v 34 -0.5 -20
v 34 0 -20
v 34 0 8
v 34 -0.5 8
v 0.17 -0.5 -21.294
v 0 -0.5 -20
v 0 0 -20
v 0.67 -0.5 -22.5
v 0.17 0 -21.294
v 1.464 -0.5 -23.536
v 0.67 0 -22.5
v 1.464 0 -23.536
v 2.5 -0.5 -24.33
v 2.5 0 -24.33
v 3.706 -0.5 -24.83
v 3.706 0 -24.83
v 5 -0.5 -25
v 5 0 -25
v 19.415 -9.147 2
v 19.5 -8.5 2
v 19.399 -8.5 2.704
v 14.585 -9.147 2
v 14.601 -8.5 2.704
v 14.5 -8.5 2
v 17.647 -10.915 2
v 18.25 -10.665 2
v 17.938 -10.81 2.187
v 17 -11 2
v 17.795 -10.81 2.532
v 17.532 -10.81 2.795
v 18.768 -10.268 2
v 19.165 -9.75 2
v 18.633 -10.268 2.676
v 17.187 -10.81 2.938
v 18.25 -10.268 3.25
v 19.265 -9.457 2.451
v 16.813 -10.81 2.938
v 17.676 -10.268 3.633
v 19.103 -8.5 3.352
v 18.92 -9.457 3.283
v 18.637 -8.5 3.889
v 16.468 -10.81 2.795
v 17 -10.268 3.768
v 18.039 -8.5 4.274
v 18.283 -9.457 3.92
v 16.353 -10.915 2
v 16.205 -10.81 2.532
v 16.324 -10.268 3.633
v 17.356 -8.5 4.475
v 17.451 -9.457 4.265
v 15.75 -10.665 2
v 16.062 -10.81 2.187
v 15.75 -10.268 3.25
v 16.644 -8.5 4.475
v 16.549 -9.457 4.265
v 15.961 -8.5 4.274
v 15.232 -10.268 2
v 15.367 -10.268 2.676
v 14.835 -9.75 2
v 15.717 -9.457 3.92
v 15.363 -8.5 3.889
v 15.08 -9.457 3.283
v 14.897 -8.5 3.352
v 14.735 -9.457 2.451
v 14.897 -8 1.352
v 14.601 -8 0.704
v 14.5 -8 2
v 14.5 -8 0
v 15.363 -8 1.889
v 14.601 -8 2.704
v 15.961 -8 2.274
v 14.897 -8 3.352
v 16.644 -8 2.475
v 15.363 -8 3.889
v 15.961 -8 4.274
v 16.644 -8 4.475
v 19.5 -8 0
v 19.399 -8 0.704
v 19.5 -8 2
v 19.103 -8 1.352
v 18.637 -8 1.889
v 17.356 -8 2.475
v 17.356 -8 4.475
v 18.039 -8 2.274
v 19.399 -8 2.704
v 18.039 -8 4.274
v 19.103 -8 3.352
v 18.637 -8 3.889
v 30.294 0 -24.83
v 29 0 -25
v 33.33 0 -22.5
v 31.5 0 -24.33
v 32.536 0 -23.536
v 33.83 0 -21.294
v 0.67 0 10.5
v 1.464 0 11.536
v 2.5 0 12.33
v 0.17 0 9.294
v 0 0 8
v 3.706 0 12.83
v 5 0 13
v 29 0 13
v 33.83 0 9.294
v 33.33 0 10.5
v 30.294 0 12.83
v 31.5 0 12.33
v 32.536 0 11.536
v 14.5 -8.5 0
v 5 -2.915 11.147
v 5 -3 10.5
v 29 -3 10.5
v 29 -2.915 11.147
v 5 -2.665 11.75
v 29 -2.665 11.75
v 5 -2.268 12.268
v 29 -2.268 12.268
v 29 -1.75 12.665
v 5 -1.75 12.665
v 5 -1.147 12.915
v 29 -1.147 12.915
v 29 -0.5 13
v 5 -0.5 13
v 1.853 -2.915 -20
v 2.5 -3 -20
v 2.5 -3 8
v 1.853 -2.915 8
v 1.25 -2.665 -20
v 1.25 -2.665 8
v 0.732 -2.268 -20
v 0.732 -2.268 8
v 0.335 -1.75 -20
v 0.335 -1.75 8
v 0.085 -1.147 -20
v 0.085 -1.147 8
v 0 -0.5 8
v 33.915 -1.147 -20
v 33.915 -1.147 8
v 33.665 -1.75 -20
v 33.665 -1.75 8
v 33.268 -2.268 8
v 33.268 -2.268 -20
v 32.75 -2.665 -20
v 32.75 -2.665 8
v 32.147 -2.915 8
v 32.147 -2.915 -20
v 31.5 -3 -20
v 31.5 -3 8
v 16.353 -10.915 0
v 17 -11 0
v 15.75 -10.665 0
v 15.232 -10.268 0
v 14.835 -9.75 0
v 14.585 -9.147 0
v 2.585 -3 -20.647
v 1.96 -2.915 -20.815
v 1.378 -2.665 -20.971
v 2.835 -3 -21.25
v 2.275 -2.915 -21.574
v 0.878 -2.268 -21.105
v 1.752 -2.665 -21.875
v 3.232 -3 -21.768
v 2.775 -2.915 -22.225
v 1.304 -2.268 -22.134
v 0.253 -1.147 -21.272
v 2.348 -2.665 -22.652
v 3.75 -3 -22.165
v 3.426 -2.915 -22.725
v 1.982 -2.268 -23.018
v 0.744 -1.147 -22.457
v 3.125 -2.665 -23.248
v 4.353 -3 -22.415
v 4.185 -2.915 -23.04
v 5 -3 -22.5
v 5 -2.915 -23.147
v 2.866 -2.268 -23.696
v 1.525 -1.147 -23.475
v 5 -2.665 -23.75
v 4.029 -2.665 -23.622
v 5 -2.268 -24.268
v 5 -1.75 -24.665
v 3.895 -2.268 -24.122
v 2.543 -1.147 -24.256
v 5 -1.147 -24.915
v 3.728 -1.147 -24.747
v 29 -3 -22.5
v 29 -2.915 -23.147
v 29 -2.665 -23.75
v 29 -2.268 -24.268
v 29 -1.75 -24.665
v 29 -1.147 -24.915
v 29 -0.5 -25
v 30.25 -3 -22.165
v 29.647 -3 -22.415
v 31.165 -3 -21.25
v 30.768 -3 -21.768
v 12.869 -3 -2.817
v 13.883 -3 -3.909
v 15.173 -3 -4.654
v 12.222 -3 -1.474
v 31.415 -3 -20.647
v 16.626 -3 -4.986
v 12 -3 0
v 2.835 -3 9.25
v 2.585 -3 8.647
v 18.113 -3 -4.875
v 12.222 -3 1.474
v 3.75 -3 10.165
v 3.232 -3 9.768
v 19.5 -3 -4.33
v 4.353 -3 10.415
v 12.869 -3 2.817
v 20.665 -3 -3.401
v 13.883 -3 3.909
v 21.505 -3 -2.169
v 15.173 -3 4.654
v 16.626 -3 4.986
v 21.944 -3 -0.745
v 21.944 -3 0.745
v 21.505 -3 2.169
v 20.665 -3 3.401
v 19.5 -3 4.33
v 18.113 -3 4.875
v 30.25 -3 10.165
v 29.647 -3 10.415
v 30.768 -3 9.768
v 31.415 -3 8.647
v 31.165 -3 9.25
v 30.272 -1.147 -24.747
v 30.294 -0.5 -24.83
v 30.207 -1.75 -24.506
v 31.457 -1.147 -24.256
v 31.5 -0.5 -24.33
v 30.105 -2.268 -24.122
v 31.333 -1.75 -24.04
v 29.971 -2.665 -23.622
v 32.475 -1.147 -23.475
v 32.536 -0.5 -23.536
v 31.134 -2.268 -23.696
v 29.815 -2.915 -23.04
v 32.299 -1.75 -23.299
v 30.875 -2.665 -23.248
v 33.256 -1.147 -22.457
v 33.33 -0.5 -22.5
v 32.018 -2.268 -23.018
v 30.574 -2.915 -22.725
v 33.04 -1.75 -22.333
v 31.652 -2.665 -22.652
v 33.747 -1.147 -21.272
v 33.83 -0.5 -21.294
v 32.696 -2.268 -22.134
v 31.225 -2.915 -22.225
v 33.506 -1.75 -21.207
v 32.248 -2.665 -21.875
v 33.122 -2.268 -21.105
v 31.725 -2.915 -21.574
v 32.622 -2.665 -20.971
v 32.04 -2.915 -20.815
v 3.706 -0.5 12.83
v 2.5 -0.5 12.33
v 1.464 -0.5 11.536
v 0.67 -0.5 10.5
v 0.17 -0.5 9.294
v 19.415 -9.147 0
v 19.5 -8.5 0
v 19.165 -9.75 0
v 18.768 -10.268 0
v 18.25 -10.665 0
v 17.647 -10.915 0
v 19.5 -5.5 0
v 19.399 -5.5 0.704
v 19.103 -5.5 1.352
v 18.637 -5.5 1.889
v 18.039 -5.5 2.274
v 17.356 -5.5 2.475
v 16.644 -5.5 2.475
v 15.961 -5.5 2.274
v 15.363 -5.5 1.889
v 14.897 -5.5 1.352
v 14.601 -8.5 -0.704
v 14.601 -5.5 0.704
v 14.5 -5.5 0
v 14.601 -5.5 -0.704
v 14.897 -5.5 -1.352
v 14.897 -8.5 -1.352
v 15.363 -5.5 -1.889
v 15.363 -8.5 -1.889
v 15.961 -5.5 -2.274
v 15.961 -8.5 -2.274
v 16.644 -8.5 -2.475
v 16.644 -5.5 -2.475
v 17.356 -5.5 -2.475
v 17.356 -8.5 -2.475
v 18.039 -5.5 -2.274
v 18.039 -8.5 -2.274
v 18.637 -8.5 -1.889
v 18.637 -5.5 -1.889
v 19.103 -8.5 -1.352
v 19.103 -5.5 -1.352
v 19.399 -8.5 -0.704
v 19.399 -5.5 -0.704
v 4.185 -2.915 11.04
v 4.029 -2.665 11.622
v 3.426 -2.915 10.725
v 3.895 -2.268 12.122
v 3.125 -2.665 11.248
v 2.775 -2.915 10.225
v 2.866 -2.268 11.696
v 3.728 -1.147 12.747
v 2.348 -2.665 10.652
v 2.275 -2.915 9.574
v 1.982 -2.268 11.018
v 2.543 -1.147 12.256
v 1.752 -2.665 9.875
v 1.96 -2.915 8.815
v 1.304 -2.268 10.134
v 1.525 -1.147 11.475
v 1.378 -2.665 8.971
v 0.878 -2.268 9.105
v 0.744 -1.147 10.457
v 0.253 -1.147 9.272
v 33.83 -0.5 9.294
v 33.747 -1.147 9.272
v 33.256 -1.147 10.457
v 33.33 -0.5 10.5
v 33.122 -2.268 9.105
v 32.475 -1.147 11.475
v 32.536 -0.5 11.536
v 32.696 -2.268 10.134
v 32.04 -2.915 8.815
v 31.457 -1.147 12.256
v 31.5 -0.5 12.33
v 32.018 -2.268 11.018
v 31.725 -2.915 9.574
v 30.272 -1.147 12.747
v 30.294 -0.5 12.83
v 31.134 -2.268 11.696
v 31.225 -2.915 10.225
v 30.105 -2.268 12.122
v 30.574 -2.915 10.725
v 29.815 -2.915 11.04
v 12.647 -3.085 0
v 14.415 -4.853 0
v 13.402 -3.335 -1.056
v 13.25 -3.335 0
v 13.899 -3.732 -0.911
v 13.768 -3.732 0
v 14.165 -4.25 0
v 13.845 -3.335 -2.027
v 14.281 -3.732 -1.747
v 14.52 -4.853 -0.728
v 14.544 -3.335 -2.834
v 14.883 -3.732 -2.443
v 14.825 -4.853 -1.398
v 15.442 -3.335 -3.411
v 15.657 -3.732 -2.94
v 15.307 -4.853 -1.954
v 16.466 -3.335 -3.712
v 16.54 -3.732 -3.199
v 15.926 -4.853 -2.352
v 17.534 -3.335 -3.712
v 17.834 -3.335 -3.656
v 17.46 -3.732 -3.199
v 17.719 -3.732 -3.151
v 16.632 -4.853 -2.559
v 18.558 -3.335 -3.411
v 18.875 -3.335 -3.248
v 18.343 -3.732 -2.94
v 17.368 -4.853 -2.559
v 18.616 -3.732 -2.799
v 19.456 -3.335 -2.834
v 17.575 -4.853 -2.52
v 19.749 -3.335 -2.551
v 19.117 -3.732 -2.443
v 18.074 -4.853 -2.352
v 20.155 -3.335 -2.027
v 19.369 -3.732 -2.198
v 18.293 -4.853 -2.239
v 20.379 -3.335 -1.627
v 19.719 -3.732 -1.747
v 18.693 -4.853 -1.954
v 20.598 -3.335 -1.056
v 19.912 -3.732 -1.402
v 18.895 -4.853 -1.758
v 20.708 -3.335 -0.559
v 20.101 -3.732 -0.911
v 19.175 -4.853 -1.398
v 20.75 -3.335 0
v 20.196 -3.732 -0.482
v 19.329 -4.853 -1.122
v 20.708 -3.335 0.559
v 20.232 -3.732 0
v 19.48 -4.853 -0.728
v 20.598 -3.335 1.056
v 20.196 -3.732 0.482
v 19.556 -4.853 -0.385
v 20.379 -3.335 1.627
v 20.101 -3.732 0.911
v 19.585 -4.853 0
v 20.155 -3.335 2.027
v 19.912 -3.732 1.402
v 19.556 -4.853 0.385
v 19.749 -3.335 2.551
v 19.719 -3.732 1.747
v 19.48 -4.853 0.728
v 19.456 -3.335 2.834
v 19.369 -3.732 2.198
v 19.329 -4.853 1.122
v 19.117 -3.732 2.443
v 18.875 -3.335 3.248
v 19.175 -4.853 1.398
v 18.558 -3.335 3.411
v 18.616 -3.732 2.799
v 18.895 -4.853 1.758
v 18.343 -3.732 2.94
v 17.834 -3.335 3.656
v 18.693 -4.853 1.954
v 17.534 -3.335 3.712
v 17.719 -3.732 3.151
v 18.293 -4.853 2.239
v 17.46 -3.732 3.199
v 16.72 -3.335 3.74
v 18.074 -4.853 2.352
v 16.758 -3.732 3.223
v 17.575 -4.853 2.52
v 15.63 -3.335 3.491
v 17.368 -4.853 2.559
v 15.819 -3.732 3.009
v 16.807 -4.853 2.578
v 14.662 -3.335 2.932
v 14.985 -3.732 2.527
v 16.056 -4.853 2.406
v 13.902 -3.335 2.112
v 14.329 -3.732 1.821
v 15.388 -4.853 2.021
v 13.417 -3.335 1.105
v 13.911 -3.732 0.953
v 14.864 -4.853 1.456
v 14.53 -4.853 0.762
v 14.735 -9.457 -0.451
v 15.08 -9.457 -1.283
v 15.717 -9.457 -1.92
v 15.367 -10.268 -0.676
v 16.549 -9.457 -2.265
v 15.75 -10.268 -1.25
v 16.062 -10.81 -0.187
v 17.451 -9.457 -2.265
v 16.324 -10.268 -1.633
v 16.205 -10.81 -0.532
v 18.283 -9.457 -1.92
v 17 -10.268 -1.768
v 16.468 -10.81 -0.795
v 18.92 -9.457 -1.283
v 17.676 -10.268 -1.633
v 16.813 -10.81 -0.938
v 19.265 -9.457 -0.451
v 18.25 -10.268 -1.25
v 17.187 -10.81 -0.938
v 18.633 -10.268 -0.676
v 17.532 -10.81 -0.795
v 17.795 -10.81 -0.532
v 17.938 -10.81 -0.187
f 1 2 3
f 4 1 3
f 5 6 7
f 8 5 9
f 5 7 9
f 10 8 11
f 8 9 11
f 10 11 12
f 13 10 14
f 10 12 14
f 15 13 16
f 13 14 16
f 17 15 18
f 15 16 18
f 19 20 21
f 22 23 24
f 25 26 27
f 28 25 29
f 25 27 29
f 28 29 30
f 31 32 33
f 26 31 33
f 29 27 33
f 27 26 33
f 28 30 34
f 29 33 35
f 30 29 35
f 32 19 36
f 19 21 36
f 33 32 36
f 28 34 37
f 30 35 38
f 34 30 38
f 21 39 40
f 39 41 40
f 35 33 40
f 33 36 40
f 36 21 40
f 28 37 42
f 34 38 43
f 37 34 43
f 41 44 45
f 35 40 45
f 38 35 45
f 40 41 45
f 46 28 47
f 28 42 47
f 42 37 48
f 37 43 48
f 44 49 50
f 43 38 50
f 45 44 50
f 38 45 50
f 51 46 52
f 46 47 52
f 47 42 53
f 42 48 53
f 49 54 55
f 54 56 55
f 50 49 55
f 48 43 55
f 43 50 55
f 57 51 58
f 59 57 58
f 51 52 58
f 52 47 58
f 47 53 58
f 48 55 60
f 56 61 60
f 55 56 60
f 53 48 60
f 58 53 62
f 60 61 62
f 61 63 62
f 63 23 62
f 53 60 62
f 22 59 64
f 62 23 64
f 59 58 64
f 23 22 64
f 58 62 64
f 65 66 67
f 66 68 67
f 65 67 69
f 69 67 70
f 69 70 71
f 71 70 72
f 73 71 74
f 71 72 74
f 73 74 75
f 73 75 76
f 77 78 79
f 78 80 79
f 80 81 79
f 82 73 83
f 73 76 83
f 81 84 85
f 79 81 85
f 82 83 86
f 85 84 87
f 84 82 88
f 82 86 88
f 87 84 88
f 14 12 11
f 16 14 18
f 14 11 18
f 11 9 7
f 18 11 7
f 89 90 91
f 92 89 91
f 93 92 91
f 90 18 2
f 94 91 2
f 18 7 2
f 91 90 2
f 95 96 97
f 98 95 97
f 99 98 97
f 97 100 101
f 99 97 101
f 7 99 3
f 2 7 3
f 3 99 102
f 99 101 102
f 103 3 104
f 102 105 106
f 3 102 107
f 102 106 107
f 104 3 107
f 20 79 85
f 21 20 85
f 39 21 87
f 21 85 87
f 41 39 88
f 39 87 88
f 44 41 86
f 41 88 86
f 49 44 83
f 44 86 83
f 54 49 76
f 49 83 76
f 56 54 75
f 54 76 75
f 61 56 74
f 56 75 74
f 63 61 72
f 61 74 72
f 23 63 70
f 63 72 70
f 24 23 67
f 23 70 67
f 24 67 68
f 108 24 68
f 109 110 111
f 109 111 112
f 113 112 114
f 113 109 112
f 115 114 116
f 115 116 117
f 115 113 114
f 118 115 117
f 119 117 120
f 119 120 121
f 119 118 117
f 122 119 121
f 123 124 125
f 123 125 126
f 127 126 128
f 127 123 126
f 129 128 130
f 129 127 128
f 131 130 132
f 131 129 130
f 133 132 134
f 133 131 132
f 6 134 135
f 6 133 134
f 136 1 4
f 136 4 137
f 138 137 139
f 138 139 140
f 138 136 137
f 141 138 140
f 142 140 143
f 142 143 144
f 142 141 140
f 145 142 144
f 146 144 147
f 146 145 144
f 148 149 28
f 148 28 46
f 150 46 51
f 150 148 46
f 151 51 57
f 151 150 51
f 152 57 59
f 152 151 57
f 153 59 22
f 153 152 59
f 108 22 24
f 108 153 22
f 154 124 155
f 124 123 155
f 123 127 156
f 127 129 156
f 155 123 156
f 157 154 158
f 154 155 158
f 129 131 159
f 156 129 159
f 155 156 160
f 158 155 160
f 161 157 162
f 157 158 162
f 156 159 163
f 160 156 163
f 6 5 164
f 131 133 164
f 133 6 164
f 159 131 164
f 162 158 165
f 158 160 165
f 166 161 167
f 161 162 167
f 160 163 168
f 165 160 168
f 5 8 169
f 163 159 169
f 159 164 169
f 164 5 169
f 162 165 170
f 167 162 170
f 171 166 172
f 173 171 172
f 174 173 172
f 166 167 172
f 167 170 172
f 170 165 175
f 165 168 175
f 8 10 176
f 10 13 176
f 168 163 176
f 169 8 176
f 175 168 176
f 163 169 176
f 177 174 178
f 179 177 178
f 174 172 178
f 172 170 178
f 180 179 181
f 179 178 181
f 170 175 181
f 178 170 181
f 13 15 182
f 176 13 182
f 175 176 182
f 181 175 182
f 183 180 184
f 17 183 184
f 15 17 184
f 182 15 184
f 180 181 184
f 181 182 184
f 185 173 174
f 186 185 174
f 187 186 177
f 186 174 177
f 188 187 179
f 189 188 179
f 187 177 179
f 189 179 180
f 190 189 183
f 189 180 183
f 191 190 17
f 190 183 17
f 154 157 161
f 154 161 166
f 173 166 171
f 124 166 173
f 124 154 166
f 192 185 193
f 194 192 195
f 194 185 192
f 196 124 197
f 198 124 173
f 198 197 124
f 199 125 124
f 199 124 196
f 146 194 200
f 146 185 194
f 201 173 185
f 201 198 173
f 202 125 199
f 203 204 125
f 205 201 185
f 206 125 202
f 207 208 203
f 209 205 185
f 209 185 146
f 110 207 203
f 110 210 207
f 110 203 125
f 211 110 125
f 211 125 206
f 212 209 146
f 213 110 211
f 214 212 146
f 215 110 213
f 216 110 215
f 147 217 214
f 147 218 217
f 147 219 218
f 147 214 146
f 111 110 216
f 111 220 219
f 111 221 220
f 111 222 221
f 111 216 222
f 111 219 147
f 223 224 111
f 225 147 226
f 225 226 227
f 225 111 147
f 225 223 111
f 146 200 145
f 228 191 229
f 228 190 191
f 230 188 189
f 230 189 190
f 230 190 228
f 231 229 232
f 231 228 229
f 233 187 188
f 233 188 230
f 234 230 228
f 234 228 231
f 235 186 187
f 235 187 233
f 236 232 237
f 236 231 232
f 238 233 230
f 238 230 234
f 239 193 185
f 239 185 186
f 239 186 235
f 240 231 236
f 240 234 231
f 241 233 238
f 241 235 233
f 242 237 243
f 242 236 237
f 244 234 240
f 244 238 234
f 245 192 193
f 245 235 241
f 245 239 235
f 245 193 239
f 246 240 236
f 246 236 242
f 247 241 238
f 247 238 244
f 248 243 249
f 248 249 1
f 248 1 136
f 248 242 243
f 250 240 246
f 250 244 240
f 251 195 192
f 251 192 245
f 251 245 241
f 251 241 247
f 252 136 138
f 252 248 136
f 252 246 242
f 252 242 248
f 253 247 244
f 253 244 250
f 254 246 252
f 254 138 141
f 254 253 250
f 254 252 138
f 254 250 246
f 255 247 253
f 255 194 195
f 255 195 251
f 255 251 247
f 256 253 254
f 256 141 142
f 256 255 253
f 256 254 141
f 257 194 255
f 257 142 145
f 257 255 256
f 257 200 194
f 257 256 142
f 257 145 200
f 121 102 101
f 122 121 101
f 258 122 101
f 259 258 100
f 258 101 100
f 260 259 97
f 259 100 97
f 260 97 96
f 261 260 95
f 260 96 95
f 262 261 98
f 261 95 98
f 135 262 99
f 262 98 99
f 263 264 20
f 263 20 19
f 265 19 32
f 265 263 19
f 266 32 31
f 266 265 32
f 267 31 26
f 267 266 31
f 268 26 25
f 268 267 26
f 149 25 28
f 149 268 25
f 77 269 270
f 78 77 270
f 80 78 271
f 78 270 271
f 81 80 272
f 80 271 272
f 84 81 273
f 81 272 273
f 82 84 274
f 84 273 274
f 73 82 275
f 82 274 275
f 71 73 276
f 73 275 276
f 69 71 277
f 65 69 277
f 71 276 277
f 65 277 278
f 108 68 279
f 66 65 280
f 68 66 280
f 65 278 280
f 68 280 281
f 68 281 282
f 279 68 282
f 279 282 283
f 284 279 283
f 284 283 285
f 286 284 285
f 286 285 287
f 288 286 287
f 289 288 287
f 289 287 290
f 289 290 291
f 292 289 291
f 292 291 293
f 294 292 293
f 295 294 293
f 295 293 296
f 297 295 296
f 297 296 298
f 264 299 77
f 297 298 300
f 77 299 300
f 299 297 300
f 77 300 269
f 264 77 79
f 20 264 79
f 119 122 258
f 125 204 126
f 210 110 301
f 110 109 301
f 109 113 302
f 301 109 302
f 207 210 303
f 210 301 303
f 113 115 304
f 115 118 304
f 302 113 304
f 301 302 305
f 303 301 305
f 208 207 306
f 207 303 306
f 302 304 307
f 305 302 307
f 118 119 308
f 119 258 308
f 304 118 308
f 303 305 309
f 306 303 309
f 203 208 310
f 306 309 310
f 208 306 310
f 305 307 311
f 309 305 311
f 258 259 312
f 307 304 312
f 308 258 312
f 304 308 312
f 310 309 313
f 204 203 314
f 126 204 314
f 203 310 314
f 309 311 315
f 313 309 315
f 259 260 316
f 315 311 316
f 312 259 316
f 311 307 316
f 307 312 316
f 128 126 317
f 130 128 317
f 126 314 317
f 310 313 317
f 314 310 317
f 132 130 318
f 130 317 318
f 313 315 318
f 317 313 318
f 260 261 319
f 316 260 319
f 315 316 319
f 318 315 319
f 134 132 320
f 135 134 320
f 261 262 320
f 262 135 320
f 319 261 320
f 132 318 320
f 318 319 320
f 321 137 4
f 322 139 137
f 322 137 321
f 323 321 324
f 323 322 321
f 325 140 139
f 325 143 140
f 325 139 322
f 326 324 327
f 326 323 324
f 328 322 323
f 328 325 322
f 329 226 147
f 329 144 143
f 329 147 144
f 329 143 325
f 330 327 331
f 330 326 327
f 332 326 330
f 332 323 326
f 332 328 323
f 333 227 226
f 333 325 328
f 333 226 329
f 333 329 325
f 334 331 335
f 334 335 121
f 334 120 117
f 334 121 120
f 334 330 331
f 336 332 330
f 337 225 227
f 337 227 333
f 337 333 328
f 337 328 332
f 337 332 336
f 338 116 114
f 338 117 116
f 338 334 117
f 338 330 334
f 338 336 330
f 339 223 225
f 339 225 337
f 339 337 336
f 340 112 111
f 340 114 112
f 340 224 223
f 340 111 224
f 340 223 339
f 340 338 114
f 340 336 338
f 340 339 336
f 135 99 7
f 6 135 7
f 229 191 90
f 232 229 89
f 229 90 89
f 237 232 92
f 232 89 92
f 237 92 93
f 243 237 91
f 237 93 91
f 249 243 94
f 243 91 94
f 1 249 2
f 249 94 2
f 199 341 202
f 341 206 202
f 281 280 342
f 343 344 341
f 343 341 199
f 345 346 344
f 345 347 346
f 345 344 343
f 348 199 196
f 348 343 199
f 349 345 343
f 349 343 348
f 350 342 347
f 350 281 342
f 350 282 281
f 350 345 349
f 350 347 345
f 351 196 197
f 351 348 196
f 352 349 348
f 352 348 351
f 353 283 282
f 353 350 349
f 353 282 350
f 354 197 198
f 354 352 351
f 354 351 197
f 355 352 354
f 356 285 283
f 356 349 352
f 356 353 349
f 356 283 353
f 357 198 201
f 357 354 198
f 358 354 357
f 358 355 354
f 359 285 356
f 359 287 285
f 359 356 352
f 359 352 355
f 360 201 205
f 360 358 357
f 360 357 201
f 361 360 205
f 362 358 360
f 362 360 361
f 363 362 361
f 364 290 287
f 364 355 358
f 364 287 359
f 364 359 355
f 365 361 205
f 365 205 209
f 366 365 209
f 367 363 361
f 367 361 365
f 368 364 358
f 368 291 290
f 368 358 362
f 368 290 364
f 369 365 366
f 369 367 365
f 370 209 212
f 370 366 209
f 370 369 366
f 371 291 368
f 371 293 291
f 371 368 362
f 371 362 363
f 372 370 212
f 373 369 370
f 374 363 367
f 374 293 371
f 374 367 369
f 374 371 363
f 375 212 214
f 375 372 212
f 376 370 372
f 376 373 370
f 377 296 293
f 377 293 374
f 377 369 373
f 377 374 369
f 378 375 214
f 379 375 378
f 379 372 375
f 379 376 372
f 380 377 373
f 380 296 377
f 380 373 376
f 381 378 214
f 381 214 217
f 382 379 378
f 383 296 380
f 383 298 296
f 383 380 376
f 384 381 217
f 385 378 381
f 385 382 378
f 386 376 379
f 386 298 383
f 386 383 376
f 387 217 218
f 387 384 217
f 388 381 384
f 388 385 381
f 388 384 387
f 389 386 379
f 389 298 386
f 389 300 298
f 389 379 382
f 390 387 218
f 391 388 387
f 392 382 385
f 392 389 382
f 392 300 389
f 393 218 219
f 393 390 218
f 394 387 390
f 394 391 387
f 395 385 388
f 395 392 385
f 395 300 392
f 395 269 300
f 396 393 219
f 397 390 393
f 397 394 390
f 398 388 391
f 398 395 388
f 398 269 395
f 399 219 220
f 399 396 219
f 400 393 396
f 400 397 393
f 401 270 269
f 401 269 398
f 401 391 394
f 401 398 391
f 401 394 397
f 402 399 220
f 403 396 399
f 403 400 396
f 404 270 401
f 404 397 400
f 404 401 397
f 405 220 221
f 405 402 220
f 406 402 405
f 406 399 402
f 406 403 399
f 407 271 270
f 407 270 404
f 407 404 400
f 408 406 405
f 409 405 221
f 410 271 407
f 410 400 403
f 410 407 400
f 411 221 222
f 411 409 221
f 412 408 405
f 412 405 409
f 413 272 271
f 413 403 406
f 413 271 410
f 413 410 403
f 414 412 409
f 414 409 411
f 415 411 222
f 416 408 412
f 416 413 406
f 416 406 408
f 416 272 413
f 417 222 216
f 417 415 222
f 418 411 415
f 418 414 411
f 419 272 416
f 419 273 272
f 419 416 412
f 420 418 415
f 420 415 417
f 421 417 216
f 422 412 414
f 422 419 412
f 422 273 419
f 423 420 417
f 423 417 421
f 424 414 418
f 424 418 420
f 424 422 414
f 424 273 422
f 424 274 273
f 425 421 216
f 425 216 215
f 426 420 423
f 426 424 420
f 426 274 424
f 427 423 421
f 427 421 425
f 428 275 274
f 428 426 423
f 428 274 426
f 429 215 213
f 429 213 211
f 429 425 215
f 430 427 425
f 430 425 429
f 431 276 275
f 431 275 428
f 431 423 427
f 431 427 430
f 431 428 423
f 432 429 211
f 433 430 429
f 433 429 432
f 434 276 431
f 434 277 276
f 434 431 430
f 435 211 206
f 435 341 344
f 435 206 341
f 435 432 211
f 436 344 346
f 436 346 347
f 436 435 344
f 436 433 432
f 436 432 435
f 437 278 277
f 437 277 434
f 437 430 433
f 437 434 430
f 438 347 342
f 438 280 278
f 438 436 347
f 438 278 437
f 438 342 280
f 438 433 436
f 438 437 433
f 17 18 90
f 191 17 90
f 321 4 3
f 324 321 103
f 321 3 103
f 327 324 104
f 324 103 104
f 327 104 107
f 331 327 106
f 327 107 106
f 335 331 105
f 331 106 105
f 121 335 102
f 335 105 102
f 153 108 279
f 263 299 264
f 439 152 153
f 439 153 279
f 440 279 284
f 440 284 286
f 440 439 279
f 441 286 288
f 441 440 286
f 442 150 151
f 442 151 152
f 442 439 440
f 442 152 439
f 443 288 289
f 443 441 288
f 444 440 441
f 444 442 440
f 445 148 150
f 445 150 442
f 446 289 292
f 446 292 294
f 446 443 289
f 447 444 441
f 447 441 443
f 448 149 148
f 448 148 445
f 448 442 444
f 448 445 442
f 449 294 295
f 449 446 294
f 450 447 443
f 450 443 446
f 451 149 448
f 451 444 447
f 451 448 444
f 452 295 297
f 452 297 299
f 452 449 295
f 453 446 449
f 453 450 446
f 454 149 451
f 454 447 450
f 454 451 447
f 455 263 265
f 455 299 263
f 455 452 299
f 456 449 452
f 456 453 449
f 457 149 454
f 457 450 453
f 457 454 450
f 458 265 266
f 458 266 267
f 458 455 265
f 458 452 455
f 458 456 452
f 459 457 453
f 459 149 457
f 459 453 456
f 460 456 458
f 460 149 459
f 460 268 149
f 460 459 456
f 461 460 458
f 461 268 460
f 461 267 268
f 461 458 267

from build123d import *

# Parameters (mm, degrees)
F1_DEPTH     = 3
F3_DEPTH     = 5
F5_DEPTH     = 3
F6_T3_DEPTH  = 28
F6_T5_DEPTH  = 24
F6_T7_DEPTH  = 2
F6_T10_ANGLE = 180
F6_T12_ANGLE = 90
F6_T14_ANGLE = 90
F6_T16_ANGLE = 90
F6_T18_ANGLE = 90
F6_T20_ANGLE = 180


# Not quite as in the source:
# - a fillet or chamfer that OpenCascade refuses, or shapes differently, is made with other operations: its cross-section is extruded or revolved along the edge and cut away or added


with BuildPart() as f1:
    # F0 (on Front) → F1 (new body)
    with BuildSketch(Plane.XZ):
        with BuildLine():
            Line((29, 13), (5, 13))
            ThreePointArc((5, 13), (1.4644660941, 11.5355339059), (0, 8))
            Line((0, 8), (0, -20))
            ThreePointArc((0, -20), (1.4644660941, -23.5355339059), (5, -25))
            Line((5, -25), (29, -25))
            ThreePointArc((29, -25), (32.5355339059, -23.5355339059), (34, -20))
            Line((34, -20), (34, 8))
            ThreePointArc((34, 8), (32.5355339059, 11.5355339059), (29, 13))
        make_face()
    extrude(amount=F1_DEPTH)

    # F2 (on face) → F3 (join)
    with BuildSketch(Plane.XZ.offset(3)):
        with BuildLine():
            ThreePointArc((14.5, 0), (17, -2.5), (19.5, 0))
            ThreePointArc((19.5, 0), (17, 2.5), (14.5, 0))
        make_face()
    extrude(amount=F3_DEPTH)

    # F4 (on face) → F5 (join)
    with BuildSketch(Plane.XZ.offset(8)):
        with BuildLine():
            Line((19.5, 0), (19.5, 2))
            ThreePointArc((19.5, 2), (17, 4.5), (14.5, 2))
            Line((14.5, 2), (14.5, 0))
            ThreePointArc((14.5, 0), (17, -2.5), (19.5, 0))
        make_face()
    extrude(amount=F5_DEPTH)

    # F6: fillet of radius 2.5 on 13 edges, made by hand

    # F6_s1 → F6_t2 (revolve)
    with BuildSketch(Plane.XY):
        with BuildLine():
            ThreePointArc((12, -3), (13.767766953, -3.732233047), (14.5, -5.5))
            Line((14.5, -5.5), (14.5, -3))
            Line((14.5, -3), (12, -3))
        make_face()
    revolve(axis=Axis((17, -3, 0), (0, -1, 0)))

    # F6_s4 → F6_t3 (cut)
    with BuildSketch(Plane.XY.offset(-20)):
        with BuildLine():
            ThreePointArc((34, -0.5), (33.267766953, -2.267766953), (31.5, -3))
            Line((31.5, -3), (34, -3))
            Line((34, -3), (34, -0.5))
        make_face()
        with BuildLine():
            ThreePointArc((2.5, -3), (0.732233047, -2.267766953), (0, -0.5))
            Line((0, -0.5), (0, -3))
            Line((0, -3), (2.5, -3))
        make_face()
    extrude(amount=F6_T3_DEPTH, mode=Mode.SUBTRACT)

    # F6_s6 → F6_t5 (cut)
    with BuildSketch(Plane.YZ.offset(5)):
        with BuildLine():
            ThreePointArc((-3, -22.5), (-2.267766953, -24.267766953), (-0.5, -25))
            Line((-0.5, -25), (-3, -25))
            Line((-3, -25), (-3, -22.5))
        make_face()
        with BuildLine():
            ThreePointArc((-3, 10.5), (-2.267766953, 12.267766953), (-0.5, 13))
            Line((-0.5, 13), (-3, 13))
            Line((-3, 13), (-3, 10.5))
        make_face()
    extrude(amount=F6_T5_DEPTH, mode=Mode.SUBTRACT)

    # F6_s8 → F6_t7 (cut)
    with BuildSketch(Plane.XY):
        with BuildLine():
            ThreePointArc((19.5, -8.5), (18.767766953, -10.267766953), (17, -11))
            Line((17, -11), (19.5, -11))
            Line((19.5, -11), (19.5, -8.5))
        make_face()
        with BuildLine():
            ThreePointArc((17, -11), (15.232233047, -10.267766953), (14.5, -8.5))
            Line((14.5, -8.5), (14.5, -11))
            Line((14.5, -11), (17, -11))
        make_face()
    extrude(amount=F6_T7_DEPTH, mode=Mode.SUBTRACT)

    # F6_s9 → F6_t10 (revolve, cut)
    with BuildSketch(Plane.XY):
        with BuildLine():
            ThreePointArc((14.5, -8.5), (15.232233047, -10.267766953), (17, -11))
            Line((17, -11), (14.5, -11))
            Line((14.5, -11), (14.5, -8.5))
        make_face()
    revolve(axis=Axis((17, -11, 0), (0, -1, 0)), revolution_arc=F6_T10_ANGLE, mode=Mode.SUBTRACT)

    # F6_s11 → F6_t12 (revolve, cut)
    with BuildSketch(Plane.YZ.offset(29)):
        with BuildLine():
            ThreePointArc((-0.5, -25), (-2.267766953, -24.267766953), (-3, -22.5))
            Line((-3, -22.5), (-3, -25))
            Line((-3, -25), (-0.5, -25))
        make_face()
    revolve(axis=Axis((29, -3, -20), (0, -1, 0)), revolution_arc=F6_T12_ANGLE, mode=Mode.SUBTRACT)

    # F6_s13 → F6_t14 (revolve, cut)
    with BuildSketch(Plane.XY.offset(8)):
        with BuildLine():
            ThreePointArc((34, -0.5), (33.267766953, -2.267766953), (31.5, -3))
            Line((31.5, -3), (34, -3))
            Line((34, -3), (34, -0.5))
        make_face()
    revolve(axis=Axis((29, -3, 8), (0, -1, 0)), revolution_arc=F6_T14_ANGLE, mode=Mode.SUBTRACT)

    # F6_s15 → F6_t16 (revolve, cut)
    with BuildSketch(Plane.XY.offset(-20)):
        with BuildLine():
            ThreePointArc((2.5, -3), (0.732233047, -2.267766953), (0, -0.5))
            Line((0, -0.5), (0, -3))
            Line((0, -3), (2.5, -3))
        make_face()
    revolve(axis=Axis((5, -3, -20), (0, -1, 0)), revolution_arc=F6_T16_ANGLE, mode=Mode.SUBTRACT)

    # F6_s17 → F6_t18 (revolve, cut)
    with BuildSketch(Plane.YZ.offset(5)):
        with BuildLine():
            ThreePointArc((-3, 10.5), (-2.267766953, 12.267766953), (-0.5, 13))
            Line((-0.5, 13), (-3, 13))
            Line((-3, 13), (-3, 10.5))
        make_face()
    revolve(axis=Axis((5, -3, 8), (0, -1, 0)), revolution_arc=F6_T18_ANGLE, mode=Mode.SUBTRACT)

    # F6_s19 → F6_t20 (revolve, cut)
    with BuildSketch(Plane.XY.offset(2)):
        with BuildLine():
            ThreePointArc((17, -11), (18.767766953, -10.267766953), (19.5, -8.5))
            Line((19.5, -8.5), (19.5, -11))
            Line((19.5, -11), (17, -11))
        make_face()
    revolve(axis=Axis((17, -11, 2), (0, -1, 0)), revolution_arc=F6_T20_ANGLE, mode=Mode.SUBTRACT)


solid = f1.part
